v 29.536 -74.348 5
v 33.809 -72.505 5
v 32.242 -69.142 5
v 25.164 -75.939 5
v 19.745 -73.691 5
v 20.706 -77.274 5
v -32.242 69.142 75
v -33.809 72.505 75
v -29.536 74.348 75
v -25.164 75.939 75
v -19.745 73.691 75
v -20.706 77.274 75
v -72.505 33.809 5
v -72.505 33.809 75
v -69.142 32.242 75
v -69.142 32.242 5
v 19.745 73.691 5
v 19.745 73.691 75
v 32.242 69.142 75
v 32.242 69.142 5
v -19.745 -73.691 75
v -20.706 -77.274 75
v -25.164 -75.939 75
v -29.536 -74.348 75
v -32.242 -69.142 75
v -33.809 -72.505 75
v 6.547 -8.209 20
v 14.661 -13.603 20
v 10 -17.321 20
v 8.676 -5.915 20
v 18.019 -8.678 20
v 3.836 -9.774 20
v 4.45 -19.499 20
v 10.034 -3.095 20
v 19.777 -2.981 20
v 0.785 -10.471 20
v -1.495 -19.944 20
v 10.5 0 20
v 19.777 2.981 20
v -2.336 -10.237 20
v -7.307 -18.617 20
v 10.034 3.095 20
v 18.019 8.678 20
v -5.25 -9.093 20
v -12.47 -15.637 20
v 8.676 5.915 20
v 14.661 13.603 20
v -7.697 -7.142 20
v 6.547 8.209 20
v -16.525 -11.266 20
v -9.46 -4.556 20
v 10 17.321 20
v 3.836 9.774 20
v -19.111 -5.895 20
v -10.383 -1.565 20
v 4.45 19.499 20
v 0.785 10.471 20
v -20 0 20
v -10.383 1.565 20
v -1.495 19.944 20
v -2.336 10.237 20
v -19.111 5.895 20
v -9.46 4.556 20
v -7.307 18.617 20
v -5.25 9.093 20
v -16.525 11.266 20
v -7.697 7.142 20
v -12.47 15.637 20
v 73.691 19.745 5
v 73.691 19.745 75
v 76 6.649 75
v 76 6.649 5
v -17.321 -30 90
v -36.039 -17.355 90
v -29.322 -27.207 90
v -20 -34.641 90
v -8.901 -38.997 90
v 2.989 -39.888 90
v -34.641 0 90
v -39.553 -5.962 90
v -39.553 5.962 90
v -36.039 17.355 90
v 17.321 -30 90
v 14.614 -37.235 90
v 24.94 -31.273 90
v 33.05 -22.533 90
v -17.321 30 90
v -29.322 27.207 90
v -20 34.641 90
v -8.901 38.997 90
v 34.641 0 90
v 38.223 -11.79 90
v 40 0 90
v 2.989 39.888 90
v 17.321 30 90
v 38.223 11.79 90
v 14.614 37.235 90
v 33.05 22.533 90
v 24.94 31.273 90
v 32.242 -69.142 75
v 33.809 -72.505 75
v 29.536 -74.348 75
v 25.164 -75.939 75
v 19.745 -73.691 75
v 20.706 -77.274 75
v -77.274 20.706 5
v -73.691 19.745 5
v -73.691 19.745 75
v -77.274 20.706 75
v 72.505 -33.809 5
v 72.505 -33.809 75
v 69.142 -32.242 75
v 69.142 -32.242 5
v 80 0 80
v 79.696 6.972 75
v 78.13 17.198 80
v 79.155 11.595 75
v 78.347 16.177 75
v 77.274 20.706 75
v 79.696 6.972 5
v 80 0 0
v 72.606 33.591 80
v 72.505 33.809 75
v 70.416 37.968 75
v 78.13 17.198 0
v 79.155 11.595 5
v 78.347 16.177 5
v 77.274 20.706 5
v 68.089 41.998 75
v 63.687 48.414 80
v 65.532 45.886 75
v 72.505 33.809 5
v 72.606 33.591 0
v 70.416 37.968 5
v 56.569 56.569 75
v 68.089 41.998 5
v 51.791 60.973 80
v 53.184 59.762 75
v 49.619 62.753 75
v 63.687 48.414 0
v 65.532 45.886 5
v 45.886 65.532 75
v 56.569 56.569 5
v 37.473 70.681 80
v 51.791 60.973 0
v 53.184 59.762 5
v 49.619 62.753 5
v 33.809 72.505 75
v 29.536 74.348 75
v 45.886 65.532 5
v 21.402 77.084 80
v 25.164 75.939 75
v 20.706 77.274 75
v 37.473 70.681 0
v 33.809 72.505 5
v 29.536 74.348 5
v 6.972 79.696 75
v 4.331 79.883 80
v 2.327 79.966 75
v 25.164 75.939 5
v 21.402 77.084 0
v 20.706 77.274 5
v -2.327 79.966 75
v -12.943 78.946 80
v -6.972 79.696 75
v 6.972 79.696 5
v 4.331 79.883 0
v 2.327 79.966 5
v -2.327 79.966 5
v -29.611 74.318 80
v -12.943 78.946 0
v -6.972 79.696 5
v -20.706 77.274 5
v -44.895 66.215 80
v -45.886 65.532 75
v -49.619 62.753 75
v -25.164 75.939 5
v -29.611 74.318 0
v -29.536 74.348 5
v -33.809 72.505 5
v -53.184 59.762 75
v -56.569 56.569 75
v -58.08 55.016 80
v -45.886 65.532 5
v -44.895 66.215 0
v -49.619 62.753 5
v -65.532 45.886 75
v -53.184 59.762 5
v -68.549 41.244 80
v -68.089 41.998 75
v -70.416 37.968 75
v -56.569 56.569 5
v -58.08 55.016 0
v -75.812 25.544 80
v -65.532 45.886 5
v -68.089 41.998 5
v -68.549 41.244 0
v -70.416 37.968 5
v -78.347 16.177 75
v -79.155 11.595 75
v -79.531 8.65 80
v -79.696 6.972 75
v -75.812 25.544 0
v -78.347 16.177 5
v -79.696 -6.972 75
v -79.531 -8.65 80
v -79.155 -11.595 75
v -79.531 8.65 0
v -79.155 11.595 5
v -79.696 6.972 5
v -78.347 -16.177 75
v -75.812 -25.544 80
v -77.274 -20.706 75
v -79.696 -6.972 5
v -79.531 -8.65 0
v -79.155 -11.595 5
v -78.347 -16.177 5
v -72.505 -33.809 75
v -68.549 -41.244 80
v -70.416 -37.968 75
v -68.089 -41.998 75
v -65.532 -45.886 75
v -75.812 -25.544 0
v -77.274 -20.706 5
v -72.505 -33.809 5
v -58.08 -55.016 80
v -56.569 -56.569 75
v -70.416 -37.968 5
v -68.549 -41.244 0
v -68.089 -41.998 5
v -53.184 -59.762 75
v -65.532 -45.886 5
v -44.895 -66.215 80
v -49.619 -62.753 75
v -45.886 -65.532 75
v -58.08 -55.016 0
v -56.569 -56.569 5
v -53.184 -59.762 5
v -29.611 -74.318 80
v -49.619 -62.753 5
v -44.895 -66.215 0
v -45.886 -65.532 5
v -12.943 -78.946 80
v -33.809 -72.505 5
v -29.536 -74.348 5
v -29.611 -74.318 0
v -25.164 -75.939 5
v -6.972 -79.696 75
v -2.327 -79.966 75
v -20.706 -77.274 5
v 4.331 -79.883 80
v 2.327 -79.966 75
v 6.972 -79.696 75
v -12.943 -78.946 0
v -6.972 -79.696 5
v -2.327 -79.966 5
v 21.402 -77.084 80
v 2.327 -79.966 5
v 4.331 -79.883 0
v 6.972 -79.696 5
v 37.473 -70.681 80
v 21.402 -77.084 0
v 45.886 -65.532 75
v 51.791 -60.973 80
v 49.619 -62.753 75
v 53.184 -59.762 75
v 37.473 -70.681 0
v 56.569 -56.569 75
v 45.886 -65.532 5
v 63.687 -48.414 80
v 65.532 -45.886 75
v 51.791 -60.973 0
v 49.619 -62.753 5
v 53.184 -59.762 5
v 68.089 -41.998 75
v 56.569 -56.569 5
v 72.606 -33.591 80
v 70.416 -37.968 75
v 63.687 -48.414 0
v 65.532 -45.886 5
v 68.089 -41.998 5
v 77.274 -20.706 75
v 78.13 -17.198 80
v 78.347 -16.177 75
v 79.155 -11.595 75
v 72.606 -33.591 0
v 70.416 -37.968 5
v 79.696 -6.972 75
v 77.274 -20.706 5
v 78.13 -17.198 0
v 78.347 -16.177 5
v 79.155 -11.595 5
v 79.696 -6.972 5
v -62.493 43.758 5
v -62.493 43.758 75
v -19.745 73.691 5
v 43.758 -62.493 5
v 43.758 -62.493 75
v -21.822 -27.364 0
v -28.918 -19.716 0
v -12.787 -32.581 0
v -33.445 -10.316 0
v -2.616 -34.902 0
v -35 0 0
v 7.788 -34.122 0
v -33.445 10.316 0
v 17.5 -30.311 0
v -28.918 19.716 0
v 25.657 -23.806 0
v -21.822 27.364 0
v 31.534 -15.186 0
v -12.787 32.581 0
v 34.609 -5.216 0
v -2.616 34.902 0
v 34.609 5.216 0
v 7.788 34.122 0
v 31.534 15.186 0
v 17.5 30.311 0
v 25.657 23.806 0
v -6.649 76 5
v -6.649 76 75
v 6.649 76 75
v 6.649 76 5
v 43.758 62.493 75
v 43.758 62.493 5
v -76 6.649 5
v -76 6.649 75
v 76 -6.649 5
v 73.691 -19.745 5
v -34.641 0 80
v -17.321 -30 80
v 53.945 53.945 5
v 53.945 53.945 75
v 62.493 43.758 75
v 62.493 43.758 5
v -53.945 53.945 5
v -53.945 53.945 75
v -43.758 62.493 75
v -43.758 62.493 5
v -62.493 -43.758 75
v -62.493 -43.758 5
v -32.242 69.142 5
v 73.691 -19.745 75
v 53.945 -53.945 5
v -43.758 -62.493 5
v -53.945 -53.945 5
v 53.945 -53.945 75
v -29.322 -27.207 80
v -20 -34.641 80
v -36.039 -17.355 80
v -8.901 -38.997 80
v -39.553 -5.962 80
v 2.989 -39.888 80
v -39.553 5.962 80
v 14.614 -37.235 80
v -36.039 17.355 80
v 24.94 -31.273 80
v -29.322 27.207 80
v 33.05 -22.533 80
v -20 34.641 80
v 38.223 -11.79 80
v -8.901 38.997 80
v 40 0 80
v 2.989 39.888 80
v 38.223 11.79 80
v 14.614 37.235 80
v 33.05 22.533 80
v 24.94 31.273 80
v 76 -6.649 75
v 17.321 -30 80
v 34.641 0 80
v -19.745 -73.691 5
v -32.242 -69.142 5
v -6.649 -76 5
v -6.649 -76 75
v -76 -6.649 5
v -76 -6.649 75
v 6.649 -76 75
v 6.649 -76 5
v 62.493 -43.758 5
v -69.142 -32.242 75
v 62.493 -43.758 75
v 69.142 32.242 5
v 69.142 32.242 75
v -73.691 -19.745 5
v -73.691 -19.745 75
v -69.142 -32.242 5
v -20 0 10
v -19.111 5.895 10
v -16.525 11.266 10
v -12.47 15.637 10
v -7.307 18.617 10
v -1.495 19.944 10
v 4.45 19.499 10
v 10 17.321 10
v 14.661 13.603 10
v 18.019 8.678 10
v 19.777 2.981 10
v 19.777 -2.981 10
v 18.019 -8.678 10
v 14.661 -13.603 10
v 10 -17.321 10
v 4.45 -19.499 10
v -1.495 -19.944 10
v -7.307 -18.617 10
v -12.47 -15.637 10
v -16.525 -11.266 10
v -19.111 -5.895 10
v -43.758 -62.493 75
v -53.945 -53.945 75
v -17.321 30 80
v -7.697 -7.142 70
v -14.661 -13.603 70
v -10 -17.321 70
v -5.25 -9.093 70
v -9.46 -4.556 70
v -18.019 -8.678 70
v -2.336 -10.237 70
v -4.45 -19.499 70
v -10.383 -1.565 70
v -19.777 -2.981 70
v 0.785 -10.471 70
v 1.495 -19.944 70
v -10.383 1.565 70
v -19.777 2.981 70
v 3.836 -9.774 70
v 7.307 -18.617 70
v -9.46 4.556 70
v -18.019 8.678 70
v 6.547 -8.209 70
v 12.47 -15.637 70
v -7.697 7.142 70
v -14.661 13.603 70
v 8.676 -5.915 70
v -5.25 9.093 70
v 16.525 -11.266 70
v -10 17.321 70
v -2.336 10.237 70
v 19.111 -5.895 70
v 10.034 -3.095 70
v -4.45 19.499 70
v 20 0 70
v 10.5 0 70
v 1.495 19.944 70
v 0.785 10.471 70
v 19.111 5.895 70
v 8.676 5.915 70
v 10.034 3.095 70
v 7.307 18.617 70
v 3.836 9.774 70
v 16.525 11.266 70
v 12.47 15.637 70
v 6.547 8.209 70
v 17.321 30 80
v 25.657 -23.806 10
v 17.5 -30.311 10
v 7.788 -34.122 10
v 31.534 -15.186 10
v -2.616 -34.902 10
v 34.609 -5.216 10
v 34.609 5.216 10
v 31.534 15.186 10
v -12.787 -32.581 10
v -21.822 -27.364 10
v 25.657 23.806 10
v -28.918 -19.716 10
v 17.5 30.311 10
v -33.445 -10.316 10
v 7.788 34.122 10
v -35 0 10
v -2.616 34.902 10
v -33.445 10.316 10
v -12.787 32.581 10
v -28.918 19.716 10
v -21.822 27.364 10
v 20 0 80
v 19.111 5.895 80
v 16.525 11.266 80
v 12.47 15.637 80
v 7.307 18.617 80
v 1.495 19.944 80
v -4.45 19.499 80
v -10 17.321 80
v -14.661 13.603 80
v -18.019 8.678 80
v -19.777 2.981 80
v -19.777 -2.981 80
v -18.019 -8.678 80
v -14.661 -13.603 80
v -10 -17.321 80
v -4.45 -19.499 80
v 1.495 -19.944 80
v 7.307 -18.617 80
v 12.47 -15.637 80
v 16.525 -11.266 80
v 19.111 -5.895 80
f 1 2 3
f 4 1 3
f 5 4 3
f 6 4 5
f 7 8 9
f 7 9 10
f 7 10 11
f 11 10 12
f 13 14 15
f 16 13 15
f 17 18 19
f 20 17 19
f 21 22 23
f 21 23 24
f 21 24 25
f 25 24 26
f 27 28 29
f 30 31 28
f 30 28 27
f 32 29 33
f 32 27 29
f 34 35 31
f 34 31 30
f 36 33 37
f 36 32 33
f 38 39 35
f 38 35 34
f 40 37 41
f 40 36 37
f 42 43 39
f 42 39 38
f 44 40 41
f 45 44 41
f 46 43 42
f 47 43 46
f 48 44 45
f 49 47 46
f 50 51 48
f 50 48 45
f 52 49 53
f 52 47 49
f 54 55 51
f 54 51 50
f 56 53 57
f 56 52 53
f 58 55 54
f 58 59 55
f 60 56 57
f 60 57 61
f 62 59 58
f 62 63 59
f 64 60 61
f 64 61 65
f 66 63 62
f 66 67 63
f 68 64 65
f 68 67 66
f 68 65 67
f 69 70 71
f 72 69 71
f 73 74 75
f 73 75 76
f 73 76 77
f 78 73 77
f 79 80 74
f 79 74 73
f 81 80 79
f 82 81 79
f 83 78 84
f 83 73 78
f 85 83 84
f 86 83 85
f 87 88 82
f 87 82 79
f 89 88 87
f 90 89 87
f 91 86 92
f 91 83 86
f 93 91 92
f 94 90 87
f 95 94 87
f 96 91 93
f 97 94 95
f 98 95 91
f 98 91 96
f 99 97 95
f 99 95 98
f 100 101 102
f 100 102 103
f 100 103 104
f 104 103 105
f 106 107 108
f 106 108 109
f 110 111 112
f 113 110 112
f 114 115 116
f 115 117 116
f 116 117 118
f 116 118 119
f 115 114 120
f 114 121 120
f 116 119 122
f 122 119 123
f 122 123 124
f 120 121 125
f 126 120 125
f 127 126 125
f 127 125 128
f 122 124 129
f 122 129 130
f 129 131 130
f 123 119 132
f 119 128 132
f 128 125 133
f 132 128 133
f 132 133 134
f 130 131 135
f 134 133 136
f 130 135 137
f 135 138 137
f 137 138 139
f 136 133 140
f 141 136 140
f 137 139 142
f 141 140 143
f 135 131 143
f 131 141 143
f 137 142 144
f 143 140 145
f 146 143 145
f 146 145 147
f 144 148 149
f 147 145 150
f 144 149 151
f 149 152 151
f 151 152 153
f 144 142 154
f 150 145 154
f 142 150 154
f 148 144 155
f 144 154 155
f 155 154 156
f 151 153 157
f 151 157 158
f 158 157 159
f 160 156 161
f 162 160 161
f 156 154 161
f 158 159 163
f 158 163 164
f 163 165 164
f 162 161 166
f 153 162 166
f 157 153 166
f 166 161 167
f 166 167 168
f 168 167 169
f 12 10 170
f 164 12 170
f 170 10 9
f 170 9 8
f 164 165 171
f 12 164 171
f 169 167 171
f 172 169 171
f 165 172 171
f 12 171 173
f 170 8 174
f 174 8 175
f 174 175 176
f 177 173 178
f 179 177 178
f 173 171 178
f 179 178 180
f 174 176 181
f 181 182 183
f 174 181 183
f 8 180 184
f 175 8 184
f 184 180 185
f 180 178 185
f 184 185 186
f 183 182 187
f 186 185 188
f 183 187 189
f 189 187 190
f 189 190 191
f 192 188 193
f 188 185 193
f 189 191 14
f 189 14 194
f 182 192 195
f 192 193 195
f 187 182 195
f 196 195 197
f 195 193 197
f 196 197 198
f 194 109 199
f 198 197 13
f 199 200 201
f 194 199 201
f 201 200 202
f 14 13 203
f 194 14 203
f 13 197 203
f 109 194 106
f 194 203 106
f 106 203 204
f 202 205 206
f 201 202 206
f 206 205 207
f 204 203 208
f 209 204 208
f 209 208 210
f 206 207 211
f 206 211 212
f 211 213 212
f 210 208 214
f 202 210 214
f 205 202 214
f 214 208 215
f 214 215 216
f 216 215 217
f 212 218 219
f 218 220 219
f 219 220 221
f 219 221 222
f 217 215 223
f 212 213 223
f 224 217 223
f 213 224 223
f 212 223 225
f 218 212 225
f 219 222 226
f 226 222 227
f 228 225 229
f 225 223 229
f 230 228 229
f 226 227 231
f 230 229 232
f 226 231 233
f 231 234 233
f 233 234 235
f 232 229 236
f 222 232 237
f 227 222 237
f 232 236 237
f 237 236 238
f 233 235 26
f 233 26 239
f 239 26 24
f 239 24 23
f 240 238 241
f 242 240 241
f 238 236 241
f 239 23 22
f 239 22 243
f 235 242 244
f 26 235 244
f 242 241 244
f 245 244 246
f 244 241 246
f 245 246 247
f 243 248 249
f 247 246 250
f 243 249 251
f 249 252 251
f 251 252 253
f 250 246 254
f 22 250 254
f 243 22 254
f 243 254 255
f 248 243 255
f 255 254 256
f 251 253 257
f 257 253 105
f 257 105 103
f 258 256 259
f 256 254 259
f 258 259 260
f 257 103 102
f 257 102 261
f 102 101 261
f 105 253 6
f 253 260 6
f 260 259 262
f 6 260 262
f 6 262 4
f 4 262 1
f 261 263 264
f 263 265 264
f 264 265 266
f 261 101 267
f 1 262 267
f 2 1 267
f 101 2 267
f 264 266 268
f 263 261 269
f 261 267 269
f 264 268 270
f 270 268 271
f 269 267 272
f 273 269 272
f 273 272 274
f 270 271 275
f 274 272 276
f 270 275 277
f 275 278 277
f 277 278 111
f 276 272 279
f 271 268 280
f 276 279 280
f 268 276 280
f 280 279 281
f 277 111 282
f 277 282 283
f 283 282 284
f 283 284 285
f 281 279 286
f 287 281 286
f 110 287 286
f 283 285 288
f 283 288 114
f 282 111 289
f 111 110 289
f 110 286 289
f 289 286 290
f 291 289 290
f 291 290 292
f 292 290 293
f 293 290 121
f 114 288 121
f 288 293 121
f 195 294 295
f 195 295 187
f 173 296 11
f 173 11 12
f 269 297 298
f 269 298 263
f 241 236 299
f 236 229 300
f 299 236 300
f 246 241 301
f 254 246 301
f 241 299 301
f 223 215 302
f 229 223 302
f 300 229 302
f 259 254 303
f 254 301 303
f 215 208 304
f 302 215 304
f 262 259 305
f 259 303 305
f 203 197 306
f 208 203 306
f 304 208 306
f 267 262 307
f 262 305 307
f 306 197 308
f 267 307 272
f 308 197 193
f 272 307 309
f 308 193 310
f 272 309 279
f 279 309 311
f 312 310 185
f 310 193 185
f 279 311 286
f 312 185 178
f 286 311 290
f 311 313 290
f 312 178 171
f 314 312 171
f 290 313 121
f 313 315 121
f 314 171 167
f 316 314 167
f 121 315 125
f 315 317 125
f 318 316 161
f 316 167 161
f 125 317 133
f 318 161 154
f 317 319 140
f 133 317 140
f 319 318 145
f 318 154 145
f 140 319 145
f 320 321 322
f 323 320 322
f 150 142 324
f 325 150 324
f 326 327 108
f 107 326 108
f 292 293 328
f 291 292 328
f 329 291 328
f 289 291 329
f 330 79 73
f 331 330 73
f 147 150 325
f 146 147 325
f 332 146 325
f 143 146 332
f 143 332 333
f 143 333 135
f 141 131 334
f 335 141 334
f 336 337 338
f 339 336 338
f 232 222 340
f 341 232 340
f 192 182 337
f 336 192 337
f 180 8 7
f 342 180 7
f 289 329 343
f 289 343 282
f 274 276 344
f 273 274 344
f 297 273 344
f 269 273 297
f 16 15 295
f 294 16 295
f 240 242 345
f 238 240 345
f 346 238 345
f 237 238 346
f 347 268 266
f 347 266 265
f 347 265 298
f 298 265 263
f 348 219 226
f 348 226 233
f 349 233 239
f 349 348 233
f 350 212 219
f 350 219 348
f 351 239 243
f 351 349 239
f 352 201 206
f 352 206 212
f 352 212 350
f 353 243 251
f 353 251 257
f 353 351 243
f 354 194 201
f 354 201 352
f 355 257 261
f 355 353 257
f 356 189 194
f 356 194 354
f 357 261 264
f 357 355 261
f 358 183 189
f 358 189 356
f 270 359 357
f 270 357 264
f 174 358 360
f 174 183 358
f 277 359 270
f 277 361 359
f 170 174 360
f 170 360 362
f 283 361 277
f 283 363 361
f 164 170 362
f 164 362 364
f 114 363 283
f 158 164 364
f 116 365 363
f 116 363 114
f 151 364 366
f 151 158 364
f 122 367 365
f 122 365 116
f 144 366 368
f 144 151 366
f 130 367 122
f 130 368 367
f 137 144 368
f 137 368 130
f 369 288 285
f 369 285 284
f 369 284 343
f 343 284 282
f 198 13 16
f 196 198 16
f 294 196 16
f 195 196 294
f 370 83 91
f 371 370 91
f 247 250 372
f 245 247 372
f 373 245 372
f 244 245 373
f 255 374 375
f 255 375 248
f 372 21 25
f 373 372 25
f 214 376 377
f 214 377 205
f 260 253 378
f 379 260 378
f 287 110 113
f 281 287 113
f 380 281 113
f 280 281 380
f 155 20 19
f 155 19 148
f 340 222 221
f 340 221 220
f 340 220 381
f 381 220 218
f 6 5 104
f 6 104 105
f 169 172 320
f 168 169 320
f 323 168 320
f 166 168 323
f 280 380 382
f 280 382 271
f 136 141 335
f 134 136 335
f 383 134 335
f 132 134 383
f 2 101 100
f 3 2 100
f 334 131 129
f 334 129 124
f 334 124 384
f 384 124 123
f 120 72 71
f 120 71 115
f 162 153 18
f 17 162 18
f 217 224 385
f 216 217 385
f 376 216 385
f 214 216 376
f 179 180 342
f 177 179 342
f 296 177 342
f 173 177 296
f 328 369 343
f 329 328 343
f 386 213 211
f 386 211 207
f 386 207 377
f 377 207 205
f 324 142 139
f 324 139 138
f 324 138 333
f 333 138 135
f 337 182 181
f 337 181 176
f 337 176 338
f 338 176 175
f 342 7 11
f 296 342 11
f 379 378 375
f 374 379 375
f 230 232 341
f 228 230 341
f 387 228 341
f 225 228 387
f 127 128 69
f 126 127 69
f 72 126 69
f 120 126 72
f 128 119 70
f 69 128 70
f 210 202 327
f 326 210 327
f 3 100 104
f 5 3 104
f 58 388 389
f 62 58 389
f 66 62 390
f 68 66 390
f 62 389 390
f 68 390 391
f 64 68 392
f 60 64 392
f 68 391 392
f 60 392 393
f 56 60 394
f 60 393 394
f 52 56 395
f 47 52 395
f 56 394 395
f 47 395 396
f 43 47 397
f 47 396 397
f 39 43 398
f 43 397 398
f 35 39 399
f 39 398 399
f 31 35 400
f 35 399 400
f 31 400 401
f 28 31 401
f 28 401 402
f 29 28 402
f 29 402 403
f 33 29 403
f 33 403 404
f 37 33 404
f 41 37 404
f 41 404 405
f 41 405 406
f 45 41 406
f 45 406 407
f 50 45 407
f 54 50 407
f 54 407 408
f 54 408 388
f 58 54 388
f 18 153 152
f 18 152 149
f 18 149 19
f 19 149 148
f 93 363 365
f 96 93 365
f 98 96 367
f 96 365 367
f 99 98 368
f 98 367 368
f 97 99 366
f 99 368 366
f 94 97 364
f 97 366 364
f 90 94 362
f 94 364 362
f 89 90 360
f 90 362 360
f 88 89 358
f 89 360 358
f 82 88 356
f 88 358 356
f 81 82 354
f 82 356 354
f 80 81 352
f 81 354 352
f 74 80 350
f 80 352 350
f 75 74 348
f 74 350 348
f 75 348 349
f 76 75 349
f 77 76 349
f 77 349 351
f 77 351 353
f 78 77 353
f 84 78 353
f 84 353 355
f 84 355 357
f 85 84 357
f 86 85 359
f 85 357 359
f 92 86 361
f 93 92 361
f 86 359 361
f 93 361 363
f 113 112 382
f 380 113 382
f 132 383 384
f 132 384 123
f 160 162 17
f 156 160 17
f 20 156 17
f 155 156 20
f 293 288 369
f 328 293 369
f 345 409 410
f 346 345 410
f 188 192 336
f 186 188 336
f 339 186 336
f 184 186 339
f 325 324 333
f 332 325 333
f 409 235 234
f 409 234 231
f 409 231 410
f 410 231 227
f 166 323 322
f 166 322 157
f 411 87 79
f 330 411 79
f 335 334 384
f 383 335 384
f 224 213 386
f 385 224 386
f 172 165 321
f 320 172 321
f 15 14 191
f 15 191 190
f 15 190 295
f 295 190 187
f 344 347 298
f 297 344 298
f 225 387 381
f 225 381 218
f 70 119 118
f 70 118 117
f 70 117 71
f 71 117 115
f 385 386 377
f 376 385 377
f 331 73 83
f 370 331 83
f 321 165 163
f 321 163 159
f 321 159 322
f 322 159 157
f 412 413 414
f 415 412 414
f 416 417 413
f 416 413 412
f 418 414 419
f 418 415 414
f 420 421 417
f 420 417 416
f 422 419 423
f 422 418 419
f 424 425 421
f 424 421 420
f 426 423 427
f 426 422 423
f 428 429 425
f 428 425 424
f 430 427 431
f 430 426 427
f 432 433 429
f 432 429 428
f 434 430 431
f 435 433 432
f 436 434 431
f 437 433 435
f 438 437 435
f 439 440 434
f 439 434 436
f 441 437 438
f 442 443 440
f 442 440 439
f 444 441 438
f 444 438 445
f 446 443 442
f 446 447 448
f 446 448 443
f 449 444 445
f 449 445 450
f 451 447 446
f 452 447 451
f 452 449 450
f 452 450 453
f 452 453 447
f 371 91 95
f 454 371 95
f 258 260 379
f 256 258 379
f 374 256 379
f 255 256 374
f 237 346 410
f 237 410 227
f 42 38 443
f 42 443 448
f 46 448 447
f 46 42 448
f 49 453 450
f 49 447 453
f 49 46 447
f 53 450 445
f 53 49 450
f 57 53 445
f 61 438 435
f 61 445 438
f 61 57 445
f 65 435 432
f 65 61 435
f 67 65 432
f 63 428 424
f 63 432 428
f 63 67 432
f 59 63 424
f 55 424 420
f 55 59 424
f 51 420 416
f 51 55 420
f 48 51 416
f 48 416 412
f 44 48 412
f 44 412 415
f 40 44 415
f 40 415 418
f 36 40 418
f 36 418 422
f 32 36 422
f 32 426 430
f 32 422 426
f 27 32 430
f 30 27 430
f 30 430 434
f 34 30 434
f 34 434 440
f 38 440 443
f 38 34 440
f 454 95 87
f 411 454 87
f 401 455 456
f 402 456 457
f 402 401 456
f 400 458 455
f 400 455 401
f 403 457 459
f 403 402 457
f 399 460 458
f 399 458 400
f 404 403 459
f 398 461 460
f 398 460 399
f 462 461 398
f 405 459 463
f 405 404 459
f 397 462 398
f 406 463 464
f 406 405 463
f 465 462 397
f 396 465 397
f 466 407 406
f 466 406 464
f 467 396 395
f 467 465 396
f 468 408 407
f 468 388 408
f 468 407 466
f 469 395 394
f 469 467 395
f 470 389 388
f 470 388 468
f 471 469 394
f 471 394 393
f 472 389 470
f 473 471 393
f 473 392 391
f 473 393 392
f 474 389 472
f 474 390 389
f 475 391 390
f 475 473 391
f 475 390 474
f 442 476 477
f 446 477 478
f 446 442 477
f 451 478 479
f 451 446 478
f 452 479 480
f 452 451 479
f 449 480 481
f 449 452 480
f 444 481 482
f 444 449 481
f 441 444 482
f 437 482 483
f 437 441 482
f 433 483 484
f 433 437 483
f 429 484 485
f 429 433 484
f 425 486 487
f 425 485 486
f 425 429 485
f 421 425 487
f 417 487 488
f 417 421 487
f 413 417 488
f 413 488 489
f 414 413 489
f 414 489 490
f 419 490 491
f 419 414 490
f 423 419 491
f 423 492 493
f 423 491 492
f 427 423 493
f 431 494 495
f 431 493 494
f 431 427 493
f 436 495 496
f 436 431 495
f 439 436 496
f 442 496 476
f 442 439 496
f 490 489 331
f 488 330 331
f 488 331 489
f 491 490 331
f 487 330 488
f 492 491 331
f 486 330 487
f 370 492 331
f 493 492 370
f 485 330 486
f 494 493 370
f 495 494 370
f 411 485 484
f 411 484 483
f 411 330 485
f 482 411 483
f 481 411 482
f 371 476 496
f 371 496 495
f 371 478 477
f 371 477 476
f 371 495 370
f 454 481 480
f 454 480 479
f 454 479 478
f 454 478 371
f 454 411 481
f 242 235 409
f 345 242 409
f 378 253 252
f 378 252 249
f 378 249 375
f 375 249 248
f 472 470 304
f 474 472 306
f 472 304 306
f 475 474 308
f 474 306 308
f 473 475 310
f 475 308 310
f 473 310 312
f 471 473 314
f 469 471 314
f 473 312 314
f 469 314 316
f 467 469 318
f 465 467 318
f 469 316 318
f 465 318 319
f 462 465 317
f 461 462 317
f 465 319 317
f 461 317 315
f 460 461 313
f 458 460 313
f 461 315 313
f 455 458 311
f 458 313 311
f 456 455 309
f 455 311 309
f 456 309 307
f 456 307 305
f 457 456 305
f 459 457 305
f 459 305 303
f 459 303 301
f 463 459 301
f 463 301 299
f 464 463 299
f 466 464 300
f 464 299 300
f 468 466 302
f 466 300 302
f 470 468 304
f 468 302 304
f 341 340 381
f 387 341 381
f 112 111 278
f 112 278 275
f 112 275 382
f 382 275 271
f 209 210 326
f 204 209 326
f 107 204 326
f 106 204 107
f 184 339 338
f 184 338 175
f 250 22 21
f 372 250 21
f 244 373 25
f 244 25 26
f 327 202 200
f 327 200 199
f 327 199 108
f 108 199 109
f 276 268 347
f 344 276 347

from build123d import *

# Parameters (mm, degrees)
SKETCH_1_R               = 80
SKETCH_1_R_2             = 10.5
EXTRUDE_1_DEPTH          = 80
SKETCH_2_R               = 20
CUT_EXTRUDE_1_DEPTH      = 10
SKETCH_3_R               = 20
CUT_EXTRUDE_2_DEPTH      = 20
CUT_EXTRUDE_3_DEPTH      = 70
PATTERN_CIRCULAR_1_COUNT = 18
SKETCH_6_R               = 35
CUT_EXTRUDE_4_DEPTH      = 10
SKETCH_7_R               = 40
SKETCH_7_R_2             = 20
EXTRUDE_2_DEPTH          = 10
CUT_EXTRUDE_5_DEPTH      = 10


with BuildPart() as part:
    # 草图1 → 凸台-拉伸1 (new body)
    with BuildSketch(Plane.XY):
        Circle(SKETCH_1_R)
        Circle(SKETCH_1_R_2, mode=Mode.SUBTRACT)
    extrude(amount=EXTRUDE_1_DEPTH)

    # 草图2 → 切除-拉伸1 (cut)
    with BuildSketch(Plane.XY.offset(80)):
        Circle(SKETCH_2_R)
    extrude(amount=-CUT_EXTRUDE_1_DEPTH, mode=Mode.SUBTRACT)

    # 草图3 → 切除-拉伸2 (cut)
    with BuildSketch(Plane(origin=(0, 0, 0), x_dir=(-1, 0, 0), z_dir=(0, 0, -1))):
        Circle(SKETCH_3_R)
    extrude(amount=-CUT_EXTRUDE_2_DEPTH, mode=Mode.SUBTRACT)

    # 草图4 → 切除-拉伸3 (cut)
    with BuildSketch(Plane(origin=(0, 0, 5), x_dir=(-1, 0, 0), z_dir=(0, 0, -1))):
        with BuildLine():
            Line((-6.649138428, 76), (-6.97245942, 79.695575847))
            ThreePointArc((-6.97245942, 79.695575847), (0, 80), (6.97245942, 79.695575847))
            Line((6.97245942, 79.695575847), (6.649138428, 76))
            Line((6.649138428, 76), (-6.649138428, 76))
        make_face()
    cut_extrude_3 = extrude(amount=-CUT_EXTRUDE_3_DEPTH, mode=Mode.SUBTRACT)

    # 阵列(圆周)1: 切除-拉伸3 ×18 about axis
    pattern_circular_1_axis = Axis((0, 0, 0), (0, 0, 1))
    for i in range(1, PATTERN_CIRCULAR_1_COUNT):
        add(cut_extrude_3.rotate(pattern_circular_1_axis, i * 360 / PATTERN_CIRCULAR_1_COUNT), mode=Mode.SUBTRACT)

    # 草图6 → 切除-拉伸4 (cut)
    with BuildSketch(Plane(origin=(0, 0, 0), x_dir=(-1, 0, 0), z_dir=(0, 0, -1))):
        Circle(SKETCH_6_R)
    extrude(amount=-CUT_EXTRUDE_4_DEPTH, mode=Mode.SUBTRACT)

    # 草图7 → 凸台-拉伸2 (add)
    with BuildSketch(Plane.XY.offset(80)):
        Circle(SKETCH_7_R)
        Circle(SKETCH_7_R_2, mode=Mode.SUBTRACT)
    extrude(amount=EXTRUDE_2_DEPTH)

    # 草图8 → 切除-拉伸5 (cut)
    with BuildSketch(Plane.XY.offset(90)):
        Polygon((34.641016151, 0), (17.320508076, 30), (-17.320508076, 30), (-34.641016151, 0), (-17.320508076, -30), (17.320508076, -30), align=None)
    extrude(amount=-CUT_EXTRUDE_5_DEPTH, mode=Mode.SUBTRACT)


solid = part.part
